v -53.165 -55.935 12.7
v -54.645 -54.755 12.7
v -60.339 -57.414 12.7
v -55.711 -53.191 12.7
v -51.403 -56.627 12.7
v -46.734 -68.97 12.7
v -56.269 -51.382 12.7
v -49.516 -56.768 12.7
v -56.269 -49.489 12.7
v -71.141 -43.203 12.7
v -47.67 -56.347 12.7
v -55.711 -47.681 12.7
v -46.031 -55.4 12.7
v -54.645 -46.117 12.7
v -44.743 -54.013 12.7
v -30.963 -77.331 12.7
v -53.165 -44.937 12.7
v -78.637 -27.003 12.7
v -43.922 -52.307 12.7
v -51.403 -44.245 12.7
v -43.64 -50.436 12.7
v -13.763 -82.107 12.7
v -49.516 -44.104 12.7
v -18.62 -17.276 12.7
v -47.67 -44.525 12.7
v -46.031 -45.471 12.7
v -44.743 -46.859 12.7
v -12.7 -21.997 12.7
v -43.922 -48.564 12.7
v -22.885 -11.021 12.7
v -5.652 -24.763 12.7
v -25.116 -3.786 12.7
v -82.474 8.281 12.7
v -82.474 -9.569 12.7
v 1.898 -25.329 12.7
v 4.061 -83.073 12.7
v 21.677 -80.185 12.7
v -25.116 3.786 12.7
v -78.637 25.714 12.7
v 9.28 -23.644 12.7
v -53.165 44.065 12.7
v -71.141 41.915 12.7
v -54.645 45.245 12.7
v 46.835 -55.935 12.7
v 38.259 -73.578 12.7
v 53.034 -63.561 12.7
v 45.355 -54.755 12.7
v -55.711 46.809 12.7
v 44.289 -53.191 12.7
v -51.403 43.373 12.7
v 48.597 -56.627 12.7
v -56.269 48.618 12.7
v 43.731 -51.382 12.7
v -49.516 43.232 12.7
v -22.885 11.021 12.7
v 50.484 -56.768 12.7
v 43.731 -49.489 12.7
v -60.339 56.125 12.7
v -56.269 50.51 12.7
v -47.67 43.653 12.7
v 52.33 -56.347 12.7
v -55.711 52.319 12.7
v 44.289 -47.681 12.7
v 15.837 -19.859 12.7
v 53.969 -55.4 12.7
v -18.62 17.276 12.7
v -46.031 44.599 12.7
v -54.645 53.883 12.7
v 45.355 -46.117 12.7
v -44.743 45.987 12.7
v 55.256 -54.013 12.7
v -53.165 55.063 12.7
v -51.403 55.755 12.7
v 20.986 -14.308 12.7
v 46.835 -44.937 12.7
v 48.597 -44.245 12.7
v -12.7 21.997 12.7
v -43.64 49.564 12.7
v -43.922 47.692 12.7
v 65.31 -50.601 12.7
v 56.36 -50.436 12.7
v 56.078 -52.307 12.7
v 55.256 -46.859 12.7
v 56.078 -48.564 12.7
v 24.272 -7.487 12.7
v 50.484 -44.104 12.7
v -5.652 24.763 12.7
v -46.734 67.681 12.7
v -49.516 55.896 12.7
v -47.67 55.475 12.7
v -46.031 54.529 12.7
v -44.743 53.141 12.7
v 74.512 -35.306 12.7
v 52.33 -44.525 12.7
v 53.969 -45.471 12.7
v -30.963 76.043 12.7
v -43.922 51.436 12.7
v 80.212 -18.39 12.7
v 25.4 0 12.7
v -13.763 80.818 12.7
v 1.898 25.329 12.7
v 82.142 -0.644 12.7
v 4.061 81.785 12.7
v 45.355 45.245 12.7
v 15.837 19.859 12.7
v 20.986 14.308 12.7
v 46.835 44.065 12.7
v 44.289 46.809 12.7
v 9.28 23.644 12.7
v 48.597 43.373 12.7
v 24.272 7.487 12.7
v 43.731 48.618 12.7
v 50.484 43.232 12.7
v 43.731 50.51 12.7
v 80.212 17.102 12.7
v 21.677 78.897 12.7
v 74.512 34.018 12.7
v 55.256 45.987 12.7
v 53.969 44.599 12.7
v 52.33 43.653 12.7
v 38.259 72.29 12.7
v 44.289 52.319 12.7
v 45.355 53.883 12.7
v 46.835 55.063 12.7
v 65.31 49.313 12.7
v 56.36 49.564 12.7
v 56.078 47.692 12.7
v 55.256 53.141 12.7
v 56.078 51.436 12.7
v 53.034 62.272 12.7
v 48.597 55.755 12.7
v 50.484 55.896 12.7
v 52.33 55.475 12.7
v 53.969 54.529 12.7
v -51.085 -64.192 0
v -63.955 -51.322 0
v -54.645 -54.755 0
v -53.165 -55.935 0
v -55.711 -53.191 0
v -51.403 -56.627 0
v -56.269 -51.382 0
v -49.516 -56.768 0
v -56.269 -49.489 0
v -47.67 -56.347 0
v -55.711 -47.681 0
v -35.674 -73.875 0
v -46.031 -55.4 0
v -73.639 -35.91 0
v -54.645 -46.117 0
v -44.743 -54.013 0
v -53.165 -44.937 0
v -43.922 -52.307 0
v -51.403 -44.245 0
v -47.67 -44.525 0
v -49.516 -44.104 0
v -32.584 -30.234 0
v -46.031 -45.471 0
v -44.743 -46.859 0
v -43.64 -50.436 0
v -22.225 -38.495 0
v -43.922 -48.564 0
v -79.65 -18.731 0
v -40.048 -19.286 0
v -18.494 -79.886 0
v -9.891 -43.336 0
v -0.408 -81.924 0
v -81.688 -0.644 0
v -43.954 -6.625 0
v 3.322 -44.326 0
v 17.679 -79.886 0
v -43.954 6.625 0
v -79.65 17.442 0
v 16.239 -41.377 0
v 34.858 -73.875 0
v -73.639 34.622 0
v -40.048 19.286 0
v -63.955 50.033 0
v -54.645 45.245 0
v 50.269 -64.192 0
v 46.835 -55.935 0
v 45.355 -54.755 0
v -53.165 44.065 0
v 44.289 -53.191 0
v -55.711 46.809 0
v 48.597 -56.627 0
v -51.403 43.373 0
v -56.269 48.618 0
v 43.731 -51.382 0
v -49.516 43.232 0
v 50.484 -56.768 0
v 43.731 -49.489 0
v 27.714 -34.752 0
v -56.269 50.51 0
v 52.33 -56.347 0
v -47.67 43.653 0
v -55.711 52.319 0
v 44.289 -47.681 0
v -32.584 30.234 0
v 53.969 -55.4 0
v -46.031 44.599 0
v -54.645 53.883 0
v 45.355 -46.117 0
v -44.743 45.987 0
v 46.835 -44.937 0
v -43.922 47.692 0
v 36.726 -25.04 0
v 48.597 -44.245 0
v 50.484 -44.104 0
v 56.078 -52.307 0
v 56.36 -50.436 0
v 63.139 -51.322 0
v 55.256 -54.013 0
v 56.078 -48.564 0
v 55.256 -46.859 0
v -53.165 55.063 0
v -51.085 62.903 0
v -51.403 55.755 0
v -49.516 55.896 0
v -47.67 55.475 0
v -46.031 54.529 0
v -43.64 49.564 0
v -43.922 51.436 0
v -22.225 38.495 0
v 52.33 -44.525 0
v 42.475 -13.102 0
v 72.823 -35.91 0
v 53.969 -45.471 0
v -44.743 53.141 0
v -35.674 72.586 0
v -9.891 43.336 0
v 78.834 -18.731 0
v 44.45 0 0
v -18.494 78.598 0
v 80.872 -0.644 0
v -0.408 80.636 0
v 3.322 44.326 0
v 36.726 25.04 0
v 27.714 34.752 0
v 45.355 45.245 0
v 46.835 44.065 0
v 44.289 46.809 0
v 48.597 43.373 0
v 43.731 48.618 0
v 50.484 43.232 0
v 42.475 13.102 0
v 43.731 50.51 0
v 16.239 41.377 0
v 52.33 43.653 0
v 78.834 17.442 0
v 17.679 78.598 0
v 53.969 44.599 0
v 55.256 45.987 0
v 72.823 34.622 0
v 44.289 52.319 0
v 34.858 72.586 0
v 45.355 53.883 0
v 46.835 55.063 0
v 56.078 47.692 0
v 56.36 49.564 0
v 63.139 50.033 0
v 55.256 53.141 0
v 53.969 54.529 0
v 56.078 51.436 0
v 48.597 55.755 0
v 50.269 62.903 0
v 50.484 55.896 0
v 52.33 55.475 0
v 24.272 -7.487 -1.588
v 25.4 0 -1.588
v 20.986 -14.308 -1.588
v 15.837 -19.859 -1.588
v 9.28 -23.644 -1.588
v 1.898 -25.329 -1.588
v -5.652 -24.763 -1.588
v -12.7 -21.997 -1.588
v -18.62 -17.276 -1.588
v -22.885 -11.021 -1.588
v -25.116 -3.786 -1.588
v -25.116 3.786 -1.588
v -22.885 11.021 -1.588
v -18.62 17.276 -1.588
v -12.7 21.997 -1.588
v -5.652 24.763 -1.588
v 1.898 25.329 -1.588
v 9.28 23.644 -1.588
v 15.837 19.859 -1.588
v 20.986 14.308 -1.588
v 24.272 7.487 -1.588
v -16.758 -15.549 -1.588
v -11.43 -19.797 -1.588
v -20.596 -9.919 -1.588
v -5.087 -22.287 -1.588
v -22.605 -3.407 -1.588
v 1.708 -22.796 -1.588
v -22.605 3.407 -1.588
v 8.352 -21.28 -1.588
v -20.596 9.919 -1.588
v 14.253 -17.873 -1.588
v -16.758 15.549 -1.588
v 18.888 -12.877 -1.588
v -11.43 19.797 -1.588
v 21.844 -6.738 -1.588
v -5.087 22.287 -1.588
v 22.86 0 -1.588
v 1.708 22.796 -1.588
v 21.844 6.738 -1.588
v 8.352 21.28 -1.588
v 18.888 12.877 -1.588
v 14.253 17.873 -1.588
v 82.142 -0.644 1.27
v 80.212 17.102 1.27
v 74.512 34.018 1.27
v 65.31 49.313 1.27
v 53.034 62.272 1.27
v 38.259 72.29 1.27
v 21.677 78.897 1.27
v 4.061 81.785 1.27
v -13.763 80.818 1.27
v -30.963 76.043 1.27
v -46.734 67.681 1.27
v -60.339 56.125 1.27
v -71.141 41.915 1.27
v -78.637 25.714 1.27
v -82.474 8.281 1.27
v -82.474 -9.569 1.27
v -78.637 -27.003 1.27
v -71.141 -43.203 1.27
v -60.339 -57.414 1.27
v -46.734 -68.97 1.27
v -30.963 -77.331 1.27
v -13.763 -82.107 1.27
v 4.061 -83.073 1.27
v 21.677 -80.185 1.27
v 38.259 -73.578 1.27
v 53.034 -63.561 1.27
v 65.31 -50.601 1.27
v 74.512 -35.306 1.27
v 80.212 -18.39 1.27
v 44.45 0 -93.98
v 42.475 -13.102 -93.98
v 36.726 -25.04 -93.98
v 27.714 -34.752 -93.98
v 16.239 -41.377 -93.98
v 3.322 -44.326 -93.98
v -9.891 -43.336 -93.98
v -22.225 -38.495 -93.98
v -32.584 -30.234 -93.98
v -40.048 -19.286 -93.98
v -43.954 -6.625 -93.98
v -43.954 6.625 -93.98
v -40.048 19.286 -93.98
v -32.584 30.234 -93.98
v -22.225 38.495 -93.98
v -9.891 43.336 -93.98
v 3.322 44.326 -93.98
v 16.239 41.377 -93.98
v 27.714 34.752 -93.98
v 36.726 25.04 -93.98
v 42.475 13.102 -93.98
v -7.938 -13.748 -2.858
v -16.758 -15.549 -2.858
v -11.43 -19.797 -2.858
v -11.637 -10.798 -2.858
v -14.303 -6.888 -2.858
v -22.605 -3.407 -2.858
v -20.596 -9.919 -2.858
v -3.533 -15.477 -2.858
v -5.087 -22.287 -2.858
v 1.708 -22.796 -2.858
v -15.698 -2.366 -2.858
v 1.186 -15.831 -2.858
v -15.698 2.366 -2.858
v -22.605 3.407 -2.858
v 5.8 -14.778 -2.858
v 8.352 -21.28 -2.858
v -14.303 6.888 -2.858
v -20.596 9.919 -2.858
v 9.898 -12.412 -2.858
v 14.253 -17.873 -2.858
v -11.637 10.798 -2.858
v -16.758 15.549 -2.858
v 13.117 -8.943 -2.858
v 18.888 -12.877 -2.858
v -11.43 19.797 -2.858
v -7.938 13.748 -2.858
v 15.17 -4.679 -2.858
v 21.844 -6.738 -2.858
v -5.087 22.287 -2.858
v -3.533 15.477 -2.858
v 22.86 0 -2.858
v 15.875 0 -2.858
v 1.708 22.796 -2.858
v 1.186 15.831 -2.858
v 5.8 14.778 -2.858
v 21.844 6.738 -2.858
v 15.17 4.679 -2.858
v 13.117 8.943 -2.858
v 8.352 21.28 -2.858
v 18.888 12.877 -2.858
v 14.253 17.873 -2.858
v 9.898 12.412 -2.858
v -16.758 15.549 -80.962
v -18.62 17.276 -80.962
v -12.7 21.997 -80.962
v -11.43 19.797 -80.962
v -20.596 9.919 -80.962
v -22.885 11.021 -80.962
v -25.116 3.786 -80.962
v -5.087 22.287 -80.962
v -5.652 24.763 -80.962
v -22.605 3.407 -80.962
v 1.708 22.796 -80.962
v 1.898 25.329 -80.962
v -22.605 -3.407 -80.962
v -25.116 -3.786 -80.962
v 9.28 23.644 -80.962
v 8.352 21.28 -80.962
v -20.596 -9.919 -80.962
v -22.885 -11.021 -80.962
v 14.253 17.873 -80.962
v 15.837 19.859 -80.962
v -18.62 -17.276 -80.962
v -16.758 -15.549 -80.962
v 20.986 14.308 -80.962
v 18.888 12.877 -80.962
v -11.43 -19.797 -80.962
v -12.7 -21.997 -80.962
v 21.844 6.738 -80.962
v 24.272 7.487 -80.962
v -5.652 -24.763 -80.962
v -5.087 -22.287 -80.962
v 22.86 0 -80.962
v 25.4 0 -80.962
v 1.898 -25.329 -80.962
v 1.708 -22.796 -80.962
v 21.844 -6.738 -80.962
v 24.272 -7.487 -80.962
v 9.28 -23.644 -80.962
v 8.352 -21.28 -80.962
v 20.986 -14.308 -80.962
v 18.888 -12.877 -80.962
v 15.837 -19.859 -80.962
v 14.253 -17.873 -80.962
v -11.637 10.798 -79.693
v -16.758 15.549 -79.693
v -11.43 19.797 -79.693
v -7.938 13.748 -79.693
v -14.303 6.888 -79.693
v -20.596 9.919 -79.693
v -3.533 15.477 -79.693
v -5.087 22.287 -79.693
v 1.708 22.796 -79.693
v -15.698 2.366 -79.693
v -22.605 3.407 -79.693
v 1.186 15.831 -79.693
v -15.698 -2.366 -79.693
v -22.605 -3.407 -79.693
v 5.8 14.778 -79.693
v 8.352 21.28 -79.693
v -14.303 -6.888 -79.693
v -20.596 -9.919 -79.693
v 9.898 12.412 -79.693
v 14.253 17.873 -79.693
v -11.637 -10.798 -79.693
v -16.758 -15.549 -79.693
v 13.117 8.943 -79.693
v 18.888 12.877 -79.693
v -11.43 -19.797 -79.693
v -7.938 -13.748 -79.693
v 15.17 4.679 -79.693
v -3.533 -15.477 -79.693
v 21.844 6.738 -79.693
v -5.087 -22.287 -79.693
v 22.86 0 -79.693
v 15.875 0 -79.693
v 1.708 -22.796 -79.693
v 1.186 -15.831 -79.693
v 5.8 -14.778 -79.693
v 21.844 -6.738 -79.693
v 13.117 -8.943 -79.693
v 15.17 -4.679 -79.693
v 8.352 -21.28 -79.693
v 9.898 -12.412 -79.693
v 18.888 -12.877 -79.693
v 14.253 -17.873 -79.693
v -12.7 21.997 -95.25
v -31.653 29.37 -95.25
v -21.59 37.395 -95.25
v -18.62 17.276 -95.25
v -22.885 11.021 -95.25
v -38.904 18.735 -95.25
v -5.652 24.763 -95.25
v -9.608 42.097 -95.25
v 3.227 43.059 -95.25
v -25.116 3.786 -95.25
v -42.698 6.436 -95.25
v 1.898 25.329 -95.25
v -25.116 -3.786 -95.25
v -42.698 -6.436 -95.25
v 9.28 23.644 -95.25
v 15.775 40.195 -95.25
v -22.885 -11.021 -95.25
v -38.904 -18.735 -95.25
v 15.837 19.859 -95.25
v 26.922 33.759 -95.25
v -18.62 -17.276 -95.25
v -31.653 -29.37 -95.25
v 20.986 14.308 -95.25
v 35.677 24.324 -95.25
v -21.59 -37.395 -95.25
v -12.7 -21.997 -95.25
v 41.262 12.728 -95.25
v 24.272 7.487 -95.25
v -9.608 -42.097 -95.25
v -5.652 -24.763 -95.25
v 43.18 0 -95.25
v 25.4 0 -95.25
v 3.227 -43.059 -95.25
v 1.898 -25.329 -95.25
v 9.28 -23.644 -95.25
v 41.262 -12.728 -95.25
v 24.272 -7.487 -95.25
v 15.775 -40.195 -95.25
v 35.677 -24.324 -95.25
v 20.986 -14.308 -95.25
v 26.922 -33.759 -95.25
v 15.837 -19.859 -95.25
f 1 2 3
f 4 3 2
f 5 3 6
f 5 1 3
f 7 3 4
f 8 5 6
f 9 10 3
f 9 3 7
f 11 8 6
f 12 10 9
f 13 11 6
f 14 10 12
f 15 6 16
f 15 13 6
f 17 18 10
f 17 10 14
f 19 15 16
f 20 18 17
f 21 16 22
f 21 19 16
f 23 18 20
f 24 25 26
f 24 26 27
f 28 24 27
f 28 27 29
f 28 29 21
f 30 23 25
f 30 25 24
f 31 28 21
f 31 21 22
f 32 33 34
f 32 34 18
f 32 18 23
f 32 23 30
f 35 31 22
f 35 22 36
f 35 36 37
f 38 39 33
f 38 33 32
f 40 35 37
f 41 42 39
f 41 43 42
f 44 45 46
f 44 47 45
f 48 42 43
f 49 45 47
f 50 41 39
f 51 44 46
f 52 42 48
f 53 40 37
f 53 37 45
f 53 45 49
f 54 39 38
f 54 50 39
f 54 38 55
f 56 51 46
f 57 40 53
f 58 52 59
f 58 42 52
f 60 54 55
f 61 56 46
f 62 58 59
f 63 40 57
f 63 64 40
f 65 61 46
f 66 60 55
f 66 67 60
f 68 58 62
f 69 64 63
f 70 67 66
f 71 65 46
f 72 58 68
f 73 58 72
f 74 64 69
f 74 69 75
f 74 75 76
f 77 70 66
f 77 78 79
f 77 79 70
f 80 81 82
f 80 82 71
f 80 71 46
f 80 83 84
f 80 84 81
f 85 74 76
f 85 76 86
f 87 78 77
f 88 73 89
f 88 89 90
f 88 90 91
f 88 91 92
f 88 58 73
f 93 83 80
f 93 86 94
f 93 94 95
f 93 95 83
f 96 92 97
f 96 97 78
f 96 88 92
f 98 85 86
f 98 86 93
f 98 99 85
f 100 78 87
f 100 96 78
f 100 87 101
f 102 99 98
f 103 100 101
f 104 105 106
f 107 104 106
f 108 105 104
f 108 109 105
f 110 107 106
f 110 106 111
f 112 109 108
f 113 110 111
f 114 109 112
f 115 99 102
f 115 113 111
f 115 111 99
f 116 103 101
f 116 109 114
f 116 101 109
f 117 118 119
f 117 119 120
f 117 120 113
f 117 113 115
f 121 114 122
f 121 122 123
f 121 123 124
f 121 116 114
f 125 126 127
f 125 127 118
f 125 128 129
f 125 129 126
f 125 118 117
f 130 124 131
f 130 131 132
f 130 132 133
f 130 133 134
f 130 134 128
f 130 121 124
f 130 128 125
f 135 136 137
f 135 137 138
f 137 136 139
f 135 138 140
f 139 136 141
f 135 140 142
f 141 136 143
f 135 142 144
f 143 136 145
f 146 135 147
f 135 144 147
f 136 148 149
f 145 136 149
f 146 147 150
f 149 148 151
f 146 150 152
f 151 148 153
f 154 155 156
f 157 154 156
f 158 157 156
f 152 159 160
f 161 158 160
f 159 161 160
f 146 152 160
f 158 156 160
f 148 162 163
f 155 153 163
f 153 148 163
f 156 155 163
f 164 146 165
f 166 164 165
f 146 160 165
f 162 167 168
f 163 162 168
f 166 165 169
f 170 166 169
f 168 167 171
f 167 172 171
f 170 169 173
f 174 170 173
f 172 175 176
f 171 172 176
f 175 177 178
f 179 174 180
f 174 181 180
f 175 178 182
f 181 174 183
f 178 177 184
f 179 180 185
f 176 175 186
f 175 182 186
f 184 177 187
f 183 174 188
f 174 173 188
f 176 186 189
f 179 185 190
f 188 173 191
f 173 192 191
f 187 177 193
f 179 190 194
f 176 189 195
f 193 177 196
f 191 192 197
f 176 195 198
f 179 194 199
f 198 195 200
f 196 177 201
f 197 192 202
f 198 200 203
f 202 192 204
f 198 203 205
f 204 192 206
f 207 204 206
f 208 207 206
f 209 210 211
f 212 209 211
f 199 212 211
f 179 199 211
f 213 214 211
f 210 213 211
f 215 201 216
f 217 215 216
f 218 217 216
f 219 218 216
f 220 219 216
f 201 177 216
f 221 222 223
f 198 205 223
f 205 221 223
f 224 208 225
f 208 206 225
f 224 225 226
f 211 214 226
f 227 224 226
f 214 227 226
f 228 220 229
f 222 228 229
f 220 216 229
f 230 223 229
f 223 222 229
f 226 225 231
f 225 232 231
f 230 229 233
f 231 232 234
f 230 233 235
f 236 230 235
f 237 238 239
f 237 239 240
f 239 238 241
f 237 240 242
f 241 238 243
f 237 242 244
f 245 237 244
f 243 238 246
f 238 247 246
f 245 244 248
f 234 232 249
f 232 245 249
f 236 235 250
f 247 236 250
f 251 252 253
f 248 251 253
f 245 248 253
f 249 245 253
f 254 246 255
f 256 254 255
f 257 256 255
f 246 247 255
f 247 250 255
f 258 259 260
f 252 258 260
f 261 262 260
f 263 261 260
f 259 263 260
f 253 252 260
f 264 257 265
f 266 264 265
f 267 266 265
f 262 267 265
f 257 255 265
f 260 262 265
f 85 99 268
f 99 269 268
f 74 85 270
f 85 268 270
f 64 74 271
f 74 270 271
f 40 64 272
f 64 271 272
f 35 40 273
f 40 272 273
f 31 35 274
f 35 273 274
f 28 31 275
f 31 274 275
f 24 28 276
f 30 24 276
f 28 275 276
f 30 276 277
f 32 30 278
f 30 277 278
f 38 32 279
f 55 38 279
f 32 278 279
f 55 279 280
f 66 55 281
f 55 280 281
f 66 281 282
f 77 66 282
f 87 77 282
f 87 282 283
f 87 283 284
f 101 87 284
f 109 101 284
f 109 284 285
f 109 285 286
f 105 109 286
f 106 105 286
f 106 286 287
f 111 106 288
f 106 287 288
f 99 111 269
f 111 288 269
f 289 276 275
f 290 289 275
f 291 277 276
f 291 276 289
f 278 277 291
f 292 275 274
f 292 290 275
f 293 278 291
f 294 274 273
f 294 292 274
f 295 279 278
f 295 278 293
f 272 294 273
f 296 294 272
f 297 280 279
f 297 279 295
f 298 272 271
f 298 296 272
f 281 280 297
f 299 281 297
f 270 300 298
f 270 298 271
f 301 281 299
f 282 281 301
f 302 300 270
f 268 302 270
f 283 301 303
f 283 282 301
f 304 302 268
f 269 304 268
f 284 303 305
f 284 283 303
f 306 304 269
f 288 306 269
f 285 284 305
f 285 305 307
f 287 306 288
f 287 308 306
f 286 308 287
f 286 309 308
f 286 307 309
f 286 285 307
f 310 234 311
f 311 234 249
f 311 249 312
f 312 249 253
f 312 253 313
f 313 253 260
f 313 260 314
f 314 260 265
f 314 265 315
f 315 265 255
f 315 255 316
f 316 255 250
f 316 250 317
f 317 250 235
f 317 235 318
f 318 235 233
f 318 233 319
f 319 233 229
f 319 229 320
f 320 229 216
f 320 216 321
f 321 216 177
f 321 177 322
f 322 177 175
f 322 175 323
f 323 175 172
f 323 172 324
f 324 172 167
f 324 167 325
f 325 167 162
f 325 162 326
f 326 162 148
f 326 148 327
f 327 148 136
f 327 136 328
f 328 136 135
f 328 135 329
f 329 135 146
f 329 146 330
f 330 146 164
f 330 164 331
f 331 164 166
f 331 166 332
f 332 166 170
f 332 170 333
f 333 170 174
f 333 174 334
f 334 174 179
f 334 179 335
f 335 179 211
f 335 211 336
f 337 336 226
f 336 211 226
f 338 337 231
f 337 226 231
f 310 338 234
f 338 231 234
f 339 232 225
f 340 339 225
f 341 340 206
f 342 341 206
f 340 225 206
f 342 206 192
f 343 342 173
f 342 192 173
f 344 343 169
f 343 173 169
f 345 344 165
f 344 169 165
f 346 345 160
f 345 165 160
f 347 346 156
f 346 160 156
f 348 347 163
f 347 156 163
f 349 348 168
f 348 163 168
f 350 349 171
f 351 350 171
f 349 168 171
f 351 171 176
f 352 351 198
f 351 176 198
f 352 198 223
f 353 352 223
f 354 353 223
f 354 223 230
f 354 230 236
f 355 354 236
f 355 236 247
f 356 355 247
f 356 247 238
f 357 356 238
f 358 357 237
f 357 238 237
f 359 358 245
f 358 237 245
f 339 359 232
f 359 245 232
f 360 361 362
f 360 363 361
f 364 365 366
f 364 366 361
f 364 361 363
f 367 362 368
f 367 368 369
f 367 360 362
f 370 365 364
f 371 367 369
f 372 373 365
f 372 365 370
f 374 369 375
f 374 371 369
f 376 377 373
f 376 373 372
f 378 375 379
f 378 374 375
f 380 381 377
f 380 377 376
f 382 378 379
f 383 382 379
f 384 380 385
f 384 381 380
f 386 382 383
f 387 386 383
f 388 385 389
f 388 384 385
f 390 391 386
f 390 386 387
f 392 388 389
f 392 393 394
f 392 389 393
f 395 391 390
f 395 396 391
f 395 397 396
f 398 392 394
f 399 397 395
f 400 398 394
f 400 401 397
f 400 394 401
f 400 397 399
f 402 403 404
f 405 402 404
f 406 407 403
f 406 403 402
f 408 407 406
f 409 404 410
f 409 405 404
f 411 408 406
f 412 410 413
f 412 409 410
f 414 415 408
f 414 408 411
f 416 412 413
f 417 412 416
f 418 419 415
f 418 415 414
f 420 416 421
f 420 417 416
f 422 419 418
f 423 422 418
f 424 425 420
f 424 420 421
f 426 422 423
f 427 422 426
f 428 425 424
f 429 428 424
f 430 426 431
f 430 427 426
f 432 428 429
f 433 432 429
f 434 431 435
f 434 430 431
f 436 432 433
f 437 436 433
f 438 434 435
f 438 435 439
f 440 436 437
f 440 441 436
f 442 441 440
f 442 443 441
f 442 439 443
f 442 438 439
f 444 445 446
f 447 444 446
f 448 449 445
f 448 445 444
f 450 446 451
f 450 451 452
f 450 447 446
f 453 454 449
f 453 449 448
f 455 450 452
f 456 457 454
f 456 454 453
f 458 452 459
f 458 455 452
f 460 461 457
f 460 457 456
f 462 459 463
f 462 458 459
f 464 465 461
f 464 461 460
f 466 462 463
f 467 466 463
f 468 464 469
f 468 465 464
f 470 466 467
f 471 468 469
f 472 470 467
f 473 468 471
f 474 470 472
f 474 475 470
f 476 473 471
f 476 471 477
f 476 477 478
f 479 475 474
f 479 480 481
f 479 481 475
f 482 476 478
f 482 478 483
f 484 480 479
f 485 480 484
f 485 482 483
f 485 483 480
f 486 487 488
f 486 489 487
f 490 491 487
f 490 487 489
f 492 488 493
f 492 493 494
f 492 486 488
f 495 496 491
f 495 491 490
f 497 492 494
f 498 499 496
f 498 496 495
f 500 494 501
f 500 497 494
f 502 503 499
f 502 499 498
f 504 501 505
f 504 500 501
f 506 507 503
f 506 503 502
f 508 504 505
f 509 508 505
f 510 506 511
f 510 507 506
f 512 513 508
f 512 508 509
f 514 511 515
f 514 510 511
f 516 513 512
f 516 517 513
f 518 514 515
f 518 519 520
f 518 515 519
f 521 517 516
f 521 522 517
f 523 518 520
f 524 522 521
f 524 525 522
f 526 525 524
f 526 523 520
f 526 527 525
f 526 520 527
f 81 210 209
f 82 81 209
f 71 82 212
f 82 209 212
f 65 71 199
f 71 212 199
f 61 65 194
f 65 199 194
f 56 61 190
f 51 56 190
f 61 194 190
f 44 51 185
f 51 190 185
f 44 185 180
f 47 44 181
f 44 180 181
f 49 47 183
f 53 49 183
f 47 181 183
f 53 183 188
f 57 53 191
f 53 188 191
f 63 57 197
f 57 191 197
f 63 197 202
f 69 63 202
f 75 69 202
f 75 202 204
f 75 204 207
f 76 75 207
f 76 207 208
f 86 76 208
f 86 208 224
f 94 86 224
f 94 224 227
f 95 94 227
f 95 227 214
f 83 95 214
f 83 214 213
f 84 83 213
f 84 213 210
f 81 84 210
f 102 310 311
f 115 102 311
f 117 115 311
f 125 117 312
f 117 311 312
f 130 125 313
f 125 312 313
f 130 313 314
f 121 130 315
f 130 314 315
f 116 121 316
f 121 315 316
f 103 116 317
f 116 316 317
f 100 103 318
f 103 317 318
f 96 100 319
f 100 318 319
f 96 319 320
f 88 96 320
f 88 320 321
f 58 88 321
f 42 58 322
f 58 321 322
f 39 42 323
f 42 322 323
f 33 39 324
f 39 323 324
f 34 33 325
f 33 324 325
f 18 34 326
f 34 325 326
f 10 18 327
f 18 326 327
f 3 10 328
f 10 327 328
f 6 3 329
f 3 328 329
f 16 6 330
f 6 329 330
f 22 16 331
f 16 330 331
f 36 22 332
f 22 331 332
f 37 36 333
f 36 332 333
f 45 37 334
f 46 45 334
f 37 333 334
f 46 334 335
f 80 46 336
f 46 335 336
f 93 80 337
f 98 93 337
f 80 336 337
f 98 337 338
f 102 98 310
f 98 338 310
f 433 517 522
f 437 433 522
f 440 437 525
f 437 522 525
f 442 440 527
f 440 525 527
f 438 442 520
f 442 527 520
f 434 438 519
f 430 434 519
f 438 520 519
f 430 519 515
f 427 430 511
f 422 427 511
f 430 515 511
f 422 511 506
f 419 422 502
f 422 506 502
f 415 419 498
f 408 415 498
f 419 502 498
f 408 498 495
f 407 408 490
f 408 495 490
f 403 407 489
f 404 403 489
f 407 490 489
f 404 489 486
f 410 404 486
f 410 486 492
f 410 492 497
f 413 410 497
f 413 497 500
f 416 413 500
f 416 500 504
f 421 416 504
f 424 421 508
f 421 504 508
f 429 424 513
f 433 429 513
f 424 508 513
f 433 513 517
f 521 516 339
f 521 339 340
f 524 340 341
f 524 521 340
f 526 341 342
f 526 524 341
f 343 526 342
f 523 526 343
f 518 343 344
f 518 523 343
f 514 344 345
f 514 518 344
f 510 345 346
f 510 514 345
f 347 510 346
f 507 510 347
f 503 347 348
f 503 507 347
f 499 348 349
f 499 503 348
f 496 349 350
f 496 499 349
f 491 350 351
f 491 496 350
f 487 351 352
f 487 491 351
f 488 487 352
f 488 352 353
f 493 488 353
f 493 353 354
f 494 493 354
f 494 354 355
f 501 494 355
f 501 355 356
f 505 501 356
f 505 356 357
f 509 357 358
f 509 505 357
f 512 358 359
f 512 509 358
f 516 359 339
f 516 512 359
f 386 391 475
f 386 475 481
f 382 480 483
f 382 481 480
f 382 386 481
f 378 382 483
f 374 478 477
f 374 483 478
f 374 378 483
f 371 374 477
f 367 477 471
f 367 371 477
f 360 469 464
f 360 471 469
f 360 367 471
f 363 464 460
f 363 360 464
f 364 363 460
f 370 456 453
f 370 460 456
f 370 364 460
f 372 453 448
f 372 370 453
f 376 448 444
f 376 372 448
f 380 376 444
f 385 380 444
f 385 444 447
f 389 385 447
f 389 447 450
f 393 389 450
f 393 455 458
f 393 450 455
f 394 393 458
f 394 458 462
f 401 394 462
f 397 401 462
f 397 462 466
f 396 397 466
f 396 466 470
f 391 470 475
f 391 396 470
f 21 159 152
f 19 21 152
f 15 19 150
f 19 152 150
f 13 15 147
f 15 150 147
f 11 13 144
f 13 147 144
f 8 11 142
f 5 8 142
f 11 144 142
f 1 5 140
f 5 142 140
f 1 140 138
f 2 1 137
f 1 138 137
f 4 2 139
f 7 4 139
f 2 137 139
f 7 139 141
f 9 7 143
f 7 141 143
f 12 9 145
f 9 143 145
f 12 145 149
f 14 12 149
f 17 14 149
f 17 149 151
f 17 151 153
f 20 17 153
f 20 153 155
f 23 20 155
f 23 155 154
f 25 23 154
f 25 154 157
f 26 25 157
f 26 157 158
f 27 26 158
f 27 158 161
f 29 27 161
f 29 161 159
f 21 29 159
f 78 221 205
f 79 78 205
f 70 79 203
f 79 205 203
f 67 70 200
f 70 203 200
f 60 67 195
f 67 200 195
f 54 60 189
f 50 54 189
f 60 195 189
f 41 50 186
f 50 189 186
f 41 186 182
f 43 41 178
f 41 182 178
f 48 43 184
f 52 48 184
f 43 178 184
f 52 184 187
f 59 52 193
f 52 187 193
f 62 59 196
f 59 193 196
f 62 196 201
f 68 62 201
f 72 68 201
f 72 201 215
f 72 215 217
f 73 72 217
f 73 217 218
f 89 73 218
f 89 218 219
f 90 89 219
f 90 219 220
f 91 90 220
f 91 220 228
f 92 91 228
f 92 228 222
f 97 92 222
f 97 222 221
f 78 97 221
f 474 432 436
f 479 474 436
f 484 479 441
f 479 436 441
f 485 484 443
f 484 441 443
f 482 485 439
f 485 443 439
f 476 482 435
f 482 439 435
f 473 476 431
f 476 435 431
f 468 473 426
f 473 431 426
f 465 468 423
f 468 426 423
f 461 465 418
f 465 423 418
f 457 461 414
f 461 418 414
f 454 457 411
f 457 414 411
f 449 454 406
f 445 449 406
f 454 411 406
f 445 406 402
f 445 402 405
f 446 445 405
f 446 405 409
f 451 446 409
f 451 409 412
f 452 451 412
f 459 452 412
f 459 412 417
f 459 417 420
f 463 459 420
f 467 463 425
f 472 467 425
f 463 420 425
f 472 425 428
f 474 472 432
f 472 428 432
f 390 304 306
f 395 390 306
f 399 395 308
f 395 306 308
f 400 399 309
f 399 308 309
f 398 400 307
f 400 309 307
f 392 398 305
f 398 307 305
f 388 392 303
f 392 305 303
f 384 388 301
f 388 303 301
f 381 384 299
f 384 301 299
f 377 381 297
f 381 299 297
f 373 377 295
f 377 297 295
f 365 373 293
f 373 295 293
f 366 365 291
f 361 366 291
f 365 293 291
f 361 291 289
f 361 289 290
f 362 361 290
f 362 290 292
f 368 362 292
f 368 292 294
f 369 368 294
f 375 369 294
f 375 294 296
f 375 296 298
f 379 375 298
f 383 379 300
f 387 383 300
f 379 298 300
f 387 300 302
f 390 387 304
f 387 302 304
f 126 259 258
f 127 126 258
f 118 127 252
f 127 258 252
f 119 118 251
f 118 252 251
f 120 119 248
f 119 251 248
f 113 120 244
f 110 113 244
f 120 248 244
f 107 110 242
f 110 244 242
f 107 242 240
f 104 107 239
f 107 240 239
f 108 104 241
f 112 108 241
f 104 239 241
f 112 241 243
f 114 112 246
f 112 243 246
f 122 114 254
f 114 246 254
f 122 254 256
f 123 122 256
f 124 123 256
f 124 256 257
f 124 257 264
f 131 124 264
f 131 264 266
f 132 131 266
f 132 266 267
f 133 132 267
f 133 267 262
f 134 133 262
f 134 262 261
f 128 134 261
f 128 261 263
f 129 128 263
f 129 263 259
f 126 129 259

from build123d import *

# Parameters (mm, degrees)
F0_R      = 82.55
F1_DEPTH  = 12.7
F2_R      = 44.45
F4_DEPTH  = 95.25
F3_R      = 6.35
F5_DEPTH  = 25.4
F6_R      = 15.875
F7_DEPTH  = 127
F8_R      = 25.4
F8_R_2    = 15.875
F9_DEPTH  = 14.2875
F10_R     = 15.875
F11_DEPTH = 107.951
F12_R     = 25.4
F13_DEPTH = 1.5875
F14_R     = 25.4
F14_R_2   = 15.875
F15_DEPTH = 14.2875
F16_R     = 22.86
F17_DEPTH = 1.27
F18_R     = 22.86
F19_DEPTH = 1.27
F20_SIZE  = 1.27
F21_SIZE  = 1.27


with BuildPart() as f1:
    # F0 (on Top) → F1 (new body)
    with BuildSketch(Plane.XY):
        with Locations((-0.4078939673, -0.6442572922)):
            Circle(F0_R)
    extrude(amount=F1_DEPTH)

    # F2 (on face) → F4 (join)
    with BuildSketch(Plane(origin=(0, 0, 0), x_dir=(1, 0, 0), z_dir=(0, 0, -1))):
        Circle(F2_R)
    extrude(amount=F4_DEPTH)

    # F3 (on face) → F5 (cut)
    with BuildSketch(Plane(origin=(0, 0, 0), x_dir=(1, 0, 0), z_dir=(0, 0, -1))):
        with Locations((-49.9900558808, 50.4357930472)):
            Circle(F3_R)
        with Locations((50.0097441192, -49.5640069528)):
            Circle(F3_R)
        with Locations((50.0097441192, 50.4357930472)):
            Circle(F3_R)
        with Locations((-49.9900558808, -49.5640069528)):
            Circle(F3_R)
    extrude(amount=-F5_DEPTH, mode=Mode.SUBTRACT)

    # F6 (on face) → F7 (cut)
    with BuildSketch(Plane(origin=(0, 0, 0), x_dir=(1, 0, 0), z_dir=(0, 0, -1))):
        Circle(F6_R)
    extrude(amount=F7_DEPTH, mode=Mode.SUBTRACT)

    # F8 (on face) → F9 (cut)
    with BuildSketch(Plane(origin=(0, 0, 0), x_dir=(1, 0, 0), z_dir=(0, 0, -1))):
        Circle(F8_R)
        Circle(F8_R_2, mode=Mode.SUBTRACT)
    extrude(amount=-F9_DEPTH, mode=Mode.SUBTRACT)

    # F10 (on face) → F11 (cut, through all)
    with BuildSketch(Plane(origin=(0, 0, -95.25), x_dir=(1, 0, 0), z_dir=(0, 0, -1))):
        Circle(F10_R)
    extrude(amount=-F11_DEPTH, mode=Mode.SUBTRACT)

    # F12 (on face) → F13 (cut)
    with BuildSketch(Plane.XY):
        Circle(F12_R)
    extrude(amount=-F13_DEPTH, mode=Mode.SUBTRACT)

    # F14 (on face) → F15 (cut)
    with BuildSketch(Plane(origin=(0, 0, -95.25), x_dir=(1, 0, 0), z_dir=(0, 0, -1))):
        Circle(F14_R)
        Circle(F14_R_2, mode=Mode.SUBTRACT)
    extrude(amount=-F15_DEPTH, mode=Mode.SUBTRACT)

    # F16 (on face) → F17 (cut)
    with BuildSketch(Plane(origin=(0, 0, -80.9625), x_dir=(1, 0, 0), z_dir=(0, 0, -1))):
        Circle(F16_R)
    extrude(amount=-F17_DEPTH, mode=Mode.SUBTRACT)

    # F18 (on face) → F19 (cut)
    with BuildSketch(Plane.XY.offset(-1.5875)):
        Circle(F18_R)
    extrude(amount=-F19_DEPTH, mode=Mode.SUBTRACT)

    # F20
    f20_edges = [f1.edges().sort_by_distance(p)[0] for p in [
        (-82.957894, -0.644257, 0),
    ]]
    chamfer(f20_edges, length=F20_SIZE)

    # F21
    f21_edges = [f1.edges().sort_by_distance(p)[0] for p in [
        (-44.45, 0, -95.25),
    ]]
    chamfer(f21_edges, length=F21_SIZE)


solid = f1.part
